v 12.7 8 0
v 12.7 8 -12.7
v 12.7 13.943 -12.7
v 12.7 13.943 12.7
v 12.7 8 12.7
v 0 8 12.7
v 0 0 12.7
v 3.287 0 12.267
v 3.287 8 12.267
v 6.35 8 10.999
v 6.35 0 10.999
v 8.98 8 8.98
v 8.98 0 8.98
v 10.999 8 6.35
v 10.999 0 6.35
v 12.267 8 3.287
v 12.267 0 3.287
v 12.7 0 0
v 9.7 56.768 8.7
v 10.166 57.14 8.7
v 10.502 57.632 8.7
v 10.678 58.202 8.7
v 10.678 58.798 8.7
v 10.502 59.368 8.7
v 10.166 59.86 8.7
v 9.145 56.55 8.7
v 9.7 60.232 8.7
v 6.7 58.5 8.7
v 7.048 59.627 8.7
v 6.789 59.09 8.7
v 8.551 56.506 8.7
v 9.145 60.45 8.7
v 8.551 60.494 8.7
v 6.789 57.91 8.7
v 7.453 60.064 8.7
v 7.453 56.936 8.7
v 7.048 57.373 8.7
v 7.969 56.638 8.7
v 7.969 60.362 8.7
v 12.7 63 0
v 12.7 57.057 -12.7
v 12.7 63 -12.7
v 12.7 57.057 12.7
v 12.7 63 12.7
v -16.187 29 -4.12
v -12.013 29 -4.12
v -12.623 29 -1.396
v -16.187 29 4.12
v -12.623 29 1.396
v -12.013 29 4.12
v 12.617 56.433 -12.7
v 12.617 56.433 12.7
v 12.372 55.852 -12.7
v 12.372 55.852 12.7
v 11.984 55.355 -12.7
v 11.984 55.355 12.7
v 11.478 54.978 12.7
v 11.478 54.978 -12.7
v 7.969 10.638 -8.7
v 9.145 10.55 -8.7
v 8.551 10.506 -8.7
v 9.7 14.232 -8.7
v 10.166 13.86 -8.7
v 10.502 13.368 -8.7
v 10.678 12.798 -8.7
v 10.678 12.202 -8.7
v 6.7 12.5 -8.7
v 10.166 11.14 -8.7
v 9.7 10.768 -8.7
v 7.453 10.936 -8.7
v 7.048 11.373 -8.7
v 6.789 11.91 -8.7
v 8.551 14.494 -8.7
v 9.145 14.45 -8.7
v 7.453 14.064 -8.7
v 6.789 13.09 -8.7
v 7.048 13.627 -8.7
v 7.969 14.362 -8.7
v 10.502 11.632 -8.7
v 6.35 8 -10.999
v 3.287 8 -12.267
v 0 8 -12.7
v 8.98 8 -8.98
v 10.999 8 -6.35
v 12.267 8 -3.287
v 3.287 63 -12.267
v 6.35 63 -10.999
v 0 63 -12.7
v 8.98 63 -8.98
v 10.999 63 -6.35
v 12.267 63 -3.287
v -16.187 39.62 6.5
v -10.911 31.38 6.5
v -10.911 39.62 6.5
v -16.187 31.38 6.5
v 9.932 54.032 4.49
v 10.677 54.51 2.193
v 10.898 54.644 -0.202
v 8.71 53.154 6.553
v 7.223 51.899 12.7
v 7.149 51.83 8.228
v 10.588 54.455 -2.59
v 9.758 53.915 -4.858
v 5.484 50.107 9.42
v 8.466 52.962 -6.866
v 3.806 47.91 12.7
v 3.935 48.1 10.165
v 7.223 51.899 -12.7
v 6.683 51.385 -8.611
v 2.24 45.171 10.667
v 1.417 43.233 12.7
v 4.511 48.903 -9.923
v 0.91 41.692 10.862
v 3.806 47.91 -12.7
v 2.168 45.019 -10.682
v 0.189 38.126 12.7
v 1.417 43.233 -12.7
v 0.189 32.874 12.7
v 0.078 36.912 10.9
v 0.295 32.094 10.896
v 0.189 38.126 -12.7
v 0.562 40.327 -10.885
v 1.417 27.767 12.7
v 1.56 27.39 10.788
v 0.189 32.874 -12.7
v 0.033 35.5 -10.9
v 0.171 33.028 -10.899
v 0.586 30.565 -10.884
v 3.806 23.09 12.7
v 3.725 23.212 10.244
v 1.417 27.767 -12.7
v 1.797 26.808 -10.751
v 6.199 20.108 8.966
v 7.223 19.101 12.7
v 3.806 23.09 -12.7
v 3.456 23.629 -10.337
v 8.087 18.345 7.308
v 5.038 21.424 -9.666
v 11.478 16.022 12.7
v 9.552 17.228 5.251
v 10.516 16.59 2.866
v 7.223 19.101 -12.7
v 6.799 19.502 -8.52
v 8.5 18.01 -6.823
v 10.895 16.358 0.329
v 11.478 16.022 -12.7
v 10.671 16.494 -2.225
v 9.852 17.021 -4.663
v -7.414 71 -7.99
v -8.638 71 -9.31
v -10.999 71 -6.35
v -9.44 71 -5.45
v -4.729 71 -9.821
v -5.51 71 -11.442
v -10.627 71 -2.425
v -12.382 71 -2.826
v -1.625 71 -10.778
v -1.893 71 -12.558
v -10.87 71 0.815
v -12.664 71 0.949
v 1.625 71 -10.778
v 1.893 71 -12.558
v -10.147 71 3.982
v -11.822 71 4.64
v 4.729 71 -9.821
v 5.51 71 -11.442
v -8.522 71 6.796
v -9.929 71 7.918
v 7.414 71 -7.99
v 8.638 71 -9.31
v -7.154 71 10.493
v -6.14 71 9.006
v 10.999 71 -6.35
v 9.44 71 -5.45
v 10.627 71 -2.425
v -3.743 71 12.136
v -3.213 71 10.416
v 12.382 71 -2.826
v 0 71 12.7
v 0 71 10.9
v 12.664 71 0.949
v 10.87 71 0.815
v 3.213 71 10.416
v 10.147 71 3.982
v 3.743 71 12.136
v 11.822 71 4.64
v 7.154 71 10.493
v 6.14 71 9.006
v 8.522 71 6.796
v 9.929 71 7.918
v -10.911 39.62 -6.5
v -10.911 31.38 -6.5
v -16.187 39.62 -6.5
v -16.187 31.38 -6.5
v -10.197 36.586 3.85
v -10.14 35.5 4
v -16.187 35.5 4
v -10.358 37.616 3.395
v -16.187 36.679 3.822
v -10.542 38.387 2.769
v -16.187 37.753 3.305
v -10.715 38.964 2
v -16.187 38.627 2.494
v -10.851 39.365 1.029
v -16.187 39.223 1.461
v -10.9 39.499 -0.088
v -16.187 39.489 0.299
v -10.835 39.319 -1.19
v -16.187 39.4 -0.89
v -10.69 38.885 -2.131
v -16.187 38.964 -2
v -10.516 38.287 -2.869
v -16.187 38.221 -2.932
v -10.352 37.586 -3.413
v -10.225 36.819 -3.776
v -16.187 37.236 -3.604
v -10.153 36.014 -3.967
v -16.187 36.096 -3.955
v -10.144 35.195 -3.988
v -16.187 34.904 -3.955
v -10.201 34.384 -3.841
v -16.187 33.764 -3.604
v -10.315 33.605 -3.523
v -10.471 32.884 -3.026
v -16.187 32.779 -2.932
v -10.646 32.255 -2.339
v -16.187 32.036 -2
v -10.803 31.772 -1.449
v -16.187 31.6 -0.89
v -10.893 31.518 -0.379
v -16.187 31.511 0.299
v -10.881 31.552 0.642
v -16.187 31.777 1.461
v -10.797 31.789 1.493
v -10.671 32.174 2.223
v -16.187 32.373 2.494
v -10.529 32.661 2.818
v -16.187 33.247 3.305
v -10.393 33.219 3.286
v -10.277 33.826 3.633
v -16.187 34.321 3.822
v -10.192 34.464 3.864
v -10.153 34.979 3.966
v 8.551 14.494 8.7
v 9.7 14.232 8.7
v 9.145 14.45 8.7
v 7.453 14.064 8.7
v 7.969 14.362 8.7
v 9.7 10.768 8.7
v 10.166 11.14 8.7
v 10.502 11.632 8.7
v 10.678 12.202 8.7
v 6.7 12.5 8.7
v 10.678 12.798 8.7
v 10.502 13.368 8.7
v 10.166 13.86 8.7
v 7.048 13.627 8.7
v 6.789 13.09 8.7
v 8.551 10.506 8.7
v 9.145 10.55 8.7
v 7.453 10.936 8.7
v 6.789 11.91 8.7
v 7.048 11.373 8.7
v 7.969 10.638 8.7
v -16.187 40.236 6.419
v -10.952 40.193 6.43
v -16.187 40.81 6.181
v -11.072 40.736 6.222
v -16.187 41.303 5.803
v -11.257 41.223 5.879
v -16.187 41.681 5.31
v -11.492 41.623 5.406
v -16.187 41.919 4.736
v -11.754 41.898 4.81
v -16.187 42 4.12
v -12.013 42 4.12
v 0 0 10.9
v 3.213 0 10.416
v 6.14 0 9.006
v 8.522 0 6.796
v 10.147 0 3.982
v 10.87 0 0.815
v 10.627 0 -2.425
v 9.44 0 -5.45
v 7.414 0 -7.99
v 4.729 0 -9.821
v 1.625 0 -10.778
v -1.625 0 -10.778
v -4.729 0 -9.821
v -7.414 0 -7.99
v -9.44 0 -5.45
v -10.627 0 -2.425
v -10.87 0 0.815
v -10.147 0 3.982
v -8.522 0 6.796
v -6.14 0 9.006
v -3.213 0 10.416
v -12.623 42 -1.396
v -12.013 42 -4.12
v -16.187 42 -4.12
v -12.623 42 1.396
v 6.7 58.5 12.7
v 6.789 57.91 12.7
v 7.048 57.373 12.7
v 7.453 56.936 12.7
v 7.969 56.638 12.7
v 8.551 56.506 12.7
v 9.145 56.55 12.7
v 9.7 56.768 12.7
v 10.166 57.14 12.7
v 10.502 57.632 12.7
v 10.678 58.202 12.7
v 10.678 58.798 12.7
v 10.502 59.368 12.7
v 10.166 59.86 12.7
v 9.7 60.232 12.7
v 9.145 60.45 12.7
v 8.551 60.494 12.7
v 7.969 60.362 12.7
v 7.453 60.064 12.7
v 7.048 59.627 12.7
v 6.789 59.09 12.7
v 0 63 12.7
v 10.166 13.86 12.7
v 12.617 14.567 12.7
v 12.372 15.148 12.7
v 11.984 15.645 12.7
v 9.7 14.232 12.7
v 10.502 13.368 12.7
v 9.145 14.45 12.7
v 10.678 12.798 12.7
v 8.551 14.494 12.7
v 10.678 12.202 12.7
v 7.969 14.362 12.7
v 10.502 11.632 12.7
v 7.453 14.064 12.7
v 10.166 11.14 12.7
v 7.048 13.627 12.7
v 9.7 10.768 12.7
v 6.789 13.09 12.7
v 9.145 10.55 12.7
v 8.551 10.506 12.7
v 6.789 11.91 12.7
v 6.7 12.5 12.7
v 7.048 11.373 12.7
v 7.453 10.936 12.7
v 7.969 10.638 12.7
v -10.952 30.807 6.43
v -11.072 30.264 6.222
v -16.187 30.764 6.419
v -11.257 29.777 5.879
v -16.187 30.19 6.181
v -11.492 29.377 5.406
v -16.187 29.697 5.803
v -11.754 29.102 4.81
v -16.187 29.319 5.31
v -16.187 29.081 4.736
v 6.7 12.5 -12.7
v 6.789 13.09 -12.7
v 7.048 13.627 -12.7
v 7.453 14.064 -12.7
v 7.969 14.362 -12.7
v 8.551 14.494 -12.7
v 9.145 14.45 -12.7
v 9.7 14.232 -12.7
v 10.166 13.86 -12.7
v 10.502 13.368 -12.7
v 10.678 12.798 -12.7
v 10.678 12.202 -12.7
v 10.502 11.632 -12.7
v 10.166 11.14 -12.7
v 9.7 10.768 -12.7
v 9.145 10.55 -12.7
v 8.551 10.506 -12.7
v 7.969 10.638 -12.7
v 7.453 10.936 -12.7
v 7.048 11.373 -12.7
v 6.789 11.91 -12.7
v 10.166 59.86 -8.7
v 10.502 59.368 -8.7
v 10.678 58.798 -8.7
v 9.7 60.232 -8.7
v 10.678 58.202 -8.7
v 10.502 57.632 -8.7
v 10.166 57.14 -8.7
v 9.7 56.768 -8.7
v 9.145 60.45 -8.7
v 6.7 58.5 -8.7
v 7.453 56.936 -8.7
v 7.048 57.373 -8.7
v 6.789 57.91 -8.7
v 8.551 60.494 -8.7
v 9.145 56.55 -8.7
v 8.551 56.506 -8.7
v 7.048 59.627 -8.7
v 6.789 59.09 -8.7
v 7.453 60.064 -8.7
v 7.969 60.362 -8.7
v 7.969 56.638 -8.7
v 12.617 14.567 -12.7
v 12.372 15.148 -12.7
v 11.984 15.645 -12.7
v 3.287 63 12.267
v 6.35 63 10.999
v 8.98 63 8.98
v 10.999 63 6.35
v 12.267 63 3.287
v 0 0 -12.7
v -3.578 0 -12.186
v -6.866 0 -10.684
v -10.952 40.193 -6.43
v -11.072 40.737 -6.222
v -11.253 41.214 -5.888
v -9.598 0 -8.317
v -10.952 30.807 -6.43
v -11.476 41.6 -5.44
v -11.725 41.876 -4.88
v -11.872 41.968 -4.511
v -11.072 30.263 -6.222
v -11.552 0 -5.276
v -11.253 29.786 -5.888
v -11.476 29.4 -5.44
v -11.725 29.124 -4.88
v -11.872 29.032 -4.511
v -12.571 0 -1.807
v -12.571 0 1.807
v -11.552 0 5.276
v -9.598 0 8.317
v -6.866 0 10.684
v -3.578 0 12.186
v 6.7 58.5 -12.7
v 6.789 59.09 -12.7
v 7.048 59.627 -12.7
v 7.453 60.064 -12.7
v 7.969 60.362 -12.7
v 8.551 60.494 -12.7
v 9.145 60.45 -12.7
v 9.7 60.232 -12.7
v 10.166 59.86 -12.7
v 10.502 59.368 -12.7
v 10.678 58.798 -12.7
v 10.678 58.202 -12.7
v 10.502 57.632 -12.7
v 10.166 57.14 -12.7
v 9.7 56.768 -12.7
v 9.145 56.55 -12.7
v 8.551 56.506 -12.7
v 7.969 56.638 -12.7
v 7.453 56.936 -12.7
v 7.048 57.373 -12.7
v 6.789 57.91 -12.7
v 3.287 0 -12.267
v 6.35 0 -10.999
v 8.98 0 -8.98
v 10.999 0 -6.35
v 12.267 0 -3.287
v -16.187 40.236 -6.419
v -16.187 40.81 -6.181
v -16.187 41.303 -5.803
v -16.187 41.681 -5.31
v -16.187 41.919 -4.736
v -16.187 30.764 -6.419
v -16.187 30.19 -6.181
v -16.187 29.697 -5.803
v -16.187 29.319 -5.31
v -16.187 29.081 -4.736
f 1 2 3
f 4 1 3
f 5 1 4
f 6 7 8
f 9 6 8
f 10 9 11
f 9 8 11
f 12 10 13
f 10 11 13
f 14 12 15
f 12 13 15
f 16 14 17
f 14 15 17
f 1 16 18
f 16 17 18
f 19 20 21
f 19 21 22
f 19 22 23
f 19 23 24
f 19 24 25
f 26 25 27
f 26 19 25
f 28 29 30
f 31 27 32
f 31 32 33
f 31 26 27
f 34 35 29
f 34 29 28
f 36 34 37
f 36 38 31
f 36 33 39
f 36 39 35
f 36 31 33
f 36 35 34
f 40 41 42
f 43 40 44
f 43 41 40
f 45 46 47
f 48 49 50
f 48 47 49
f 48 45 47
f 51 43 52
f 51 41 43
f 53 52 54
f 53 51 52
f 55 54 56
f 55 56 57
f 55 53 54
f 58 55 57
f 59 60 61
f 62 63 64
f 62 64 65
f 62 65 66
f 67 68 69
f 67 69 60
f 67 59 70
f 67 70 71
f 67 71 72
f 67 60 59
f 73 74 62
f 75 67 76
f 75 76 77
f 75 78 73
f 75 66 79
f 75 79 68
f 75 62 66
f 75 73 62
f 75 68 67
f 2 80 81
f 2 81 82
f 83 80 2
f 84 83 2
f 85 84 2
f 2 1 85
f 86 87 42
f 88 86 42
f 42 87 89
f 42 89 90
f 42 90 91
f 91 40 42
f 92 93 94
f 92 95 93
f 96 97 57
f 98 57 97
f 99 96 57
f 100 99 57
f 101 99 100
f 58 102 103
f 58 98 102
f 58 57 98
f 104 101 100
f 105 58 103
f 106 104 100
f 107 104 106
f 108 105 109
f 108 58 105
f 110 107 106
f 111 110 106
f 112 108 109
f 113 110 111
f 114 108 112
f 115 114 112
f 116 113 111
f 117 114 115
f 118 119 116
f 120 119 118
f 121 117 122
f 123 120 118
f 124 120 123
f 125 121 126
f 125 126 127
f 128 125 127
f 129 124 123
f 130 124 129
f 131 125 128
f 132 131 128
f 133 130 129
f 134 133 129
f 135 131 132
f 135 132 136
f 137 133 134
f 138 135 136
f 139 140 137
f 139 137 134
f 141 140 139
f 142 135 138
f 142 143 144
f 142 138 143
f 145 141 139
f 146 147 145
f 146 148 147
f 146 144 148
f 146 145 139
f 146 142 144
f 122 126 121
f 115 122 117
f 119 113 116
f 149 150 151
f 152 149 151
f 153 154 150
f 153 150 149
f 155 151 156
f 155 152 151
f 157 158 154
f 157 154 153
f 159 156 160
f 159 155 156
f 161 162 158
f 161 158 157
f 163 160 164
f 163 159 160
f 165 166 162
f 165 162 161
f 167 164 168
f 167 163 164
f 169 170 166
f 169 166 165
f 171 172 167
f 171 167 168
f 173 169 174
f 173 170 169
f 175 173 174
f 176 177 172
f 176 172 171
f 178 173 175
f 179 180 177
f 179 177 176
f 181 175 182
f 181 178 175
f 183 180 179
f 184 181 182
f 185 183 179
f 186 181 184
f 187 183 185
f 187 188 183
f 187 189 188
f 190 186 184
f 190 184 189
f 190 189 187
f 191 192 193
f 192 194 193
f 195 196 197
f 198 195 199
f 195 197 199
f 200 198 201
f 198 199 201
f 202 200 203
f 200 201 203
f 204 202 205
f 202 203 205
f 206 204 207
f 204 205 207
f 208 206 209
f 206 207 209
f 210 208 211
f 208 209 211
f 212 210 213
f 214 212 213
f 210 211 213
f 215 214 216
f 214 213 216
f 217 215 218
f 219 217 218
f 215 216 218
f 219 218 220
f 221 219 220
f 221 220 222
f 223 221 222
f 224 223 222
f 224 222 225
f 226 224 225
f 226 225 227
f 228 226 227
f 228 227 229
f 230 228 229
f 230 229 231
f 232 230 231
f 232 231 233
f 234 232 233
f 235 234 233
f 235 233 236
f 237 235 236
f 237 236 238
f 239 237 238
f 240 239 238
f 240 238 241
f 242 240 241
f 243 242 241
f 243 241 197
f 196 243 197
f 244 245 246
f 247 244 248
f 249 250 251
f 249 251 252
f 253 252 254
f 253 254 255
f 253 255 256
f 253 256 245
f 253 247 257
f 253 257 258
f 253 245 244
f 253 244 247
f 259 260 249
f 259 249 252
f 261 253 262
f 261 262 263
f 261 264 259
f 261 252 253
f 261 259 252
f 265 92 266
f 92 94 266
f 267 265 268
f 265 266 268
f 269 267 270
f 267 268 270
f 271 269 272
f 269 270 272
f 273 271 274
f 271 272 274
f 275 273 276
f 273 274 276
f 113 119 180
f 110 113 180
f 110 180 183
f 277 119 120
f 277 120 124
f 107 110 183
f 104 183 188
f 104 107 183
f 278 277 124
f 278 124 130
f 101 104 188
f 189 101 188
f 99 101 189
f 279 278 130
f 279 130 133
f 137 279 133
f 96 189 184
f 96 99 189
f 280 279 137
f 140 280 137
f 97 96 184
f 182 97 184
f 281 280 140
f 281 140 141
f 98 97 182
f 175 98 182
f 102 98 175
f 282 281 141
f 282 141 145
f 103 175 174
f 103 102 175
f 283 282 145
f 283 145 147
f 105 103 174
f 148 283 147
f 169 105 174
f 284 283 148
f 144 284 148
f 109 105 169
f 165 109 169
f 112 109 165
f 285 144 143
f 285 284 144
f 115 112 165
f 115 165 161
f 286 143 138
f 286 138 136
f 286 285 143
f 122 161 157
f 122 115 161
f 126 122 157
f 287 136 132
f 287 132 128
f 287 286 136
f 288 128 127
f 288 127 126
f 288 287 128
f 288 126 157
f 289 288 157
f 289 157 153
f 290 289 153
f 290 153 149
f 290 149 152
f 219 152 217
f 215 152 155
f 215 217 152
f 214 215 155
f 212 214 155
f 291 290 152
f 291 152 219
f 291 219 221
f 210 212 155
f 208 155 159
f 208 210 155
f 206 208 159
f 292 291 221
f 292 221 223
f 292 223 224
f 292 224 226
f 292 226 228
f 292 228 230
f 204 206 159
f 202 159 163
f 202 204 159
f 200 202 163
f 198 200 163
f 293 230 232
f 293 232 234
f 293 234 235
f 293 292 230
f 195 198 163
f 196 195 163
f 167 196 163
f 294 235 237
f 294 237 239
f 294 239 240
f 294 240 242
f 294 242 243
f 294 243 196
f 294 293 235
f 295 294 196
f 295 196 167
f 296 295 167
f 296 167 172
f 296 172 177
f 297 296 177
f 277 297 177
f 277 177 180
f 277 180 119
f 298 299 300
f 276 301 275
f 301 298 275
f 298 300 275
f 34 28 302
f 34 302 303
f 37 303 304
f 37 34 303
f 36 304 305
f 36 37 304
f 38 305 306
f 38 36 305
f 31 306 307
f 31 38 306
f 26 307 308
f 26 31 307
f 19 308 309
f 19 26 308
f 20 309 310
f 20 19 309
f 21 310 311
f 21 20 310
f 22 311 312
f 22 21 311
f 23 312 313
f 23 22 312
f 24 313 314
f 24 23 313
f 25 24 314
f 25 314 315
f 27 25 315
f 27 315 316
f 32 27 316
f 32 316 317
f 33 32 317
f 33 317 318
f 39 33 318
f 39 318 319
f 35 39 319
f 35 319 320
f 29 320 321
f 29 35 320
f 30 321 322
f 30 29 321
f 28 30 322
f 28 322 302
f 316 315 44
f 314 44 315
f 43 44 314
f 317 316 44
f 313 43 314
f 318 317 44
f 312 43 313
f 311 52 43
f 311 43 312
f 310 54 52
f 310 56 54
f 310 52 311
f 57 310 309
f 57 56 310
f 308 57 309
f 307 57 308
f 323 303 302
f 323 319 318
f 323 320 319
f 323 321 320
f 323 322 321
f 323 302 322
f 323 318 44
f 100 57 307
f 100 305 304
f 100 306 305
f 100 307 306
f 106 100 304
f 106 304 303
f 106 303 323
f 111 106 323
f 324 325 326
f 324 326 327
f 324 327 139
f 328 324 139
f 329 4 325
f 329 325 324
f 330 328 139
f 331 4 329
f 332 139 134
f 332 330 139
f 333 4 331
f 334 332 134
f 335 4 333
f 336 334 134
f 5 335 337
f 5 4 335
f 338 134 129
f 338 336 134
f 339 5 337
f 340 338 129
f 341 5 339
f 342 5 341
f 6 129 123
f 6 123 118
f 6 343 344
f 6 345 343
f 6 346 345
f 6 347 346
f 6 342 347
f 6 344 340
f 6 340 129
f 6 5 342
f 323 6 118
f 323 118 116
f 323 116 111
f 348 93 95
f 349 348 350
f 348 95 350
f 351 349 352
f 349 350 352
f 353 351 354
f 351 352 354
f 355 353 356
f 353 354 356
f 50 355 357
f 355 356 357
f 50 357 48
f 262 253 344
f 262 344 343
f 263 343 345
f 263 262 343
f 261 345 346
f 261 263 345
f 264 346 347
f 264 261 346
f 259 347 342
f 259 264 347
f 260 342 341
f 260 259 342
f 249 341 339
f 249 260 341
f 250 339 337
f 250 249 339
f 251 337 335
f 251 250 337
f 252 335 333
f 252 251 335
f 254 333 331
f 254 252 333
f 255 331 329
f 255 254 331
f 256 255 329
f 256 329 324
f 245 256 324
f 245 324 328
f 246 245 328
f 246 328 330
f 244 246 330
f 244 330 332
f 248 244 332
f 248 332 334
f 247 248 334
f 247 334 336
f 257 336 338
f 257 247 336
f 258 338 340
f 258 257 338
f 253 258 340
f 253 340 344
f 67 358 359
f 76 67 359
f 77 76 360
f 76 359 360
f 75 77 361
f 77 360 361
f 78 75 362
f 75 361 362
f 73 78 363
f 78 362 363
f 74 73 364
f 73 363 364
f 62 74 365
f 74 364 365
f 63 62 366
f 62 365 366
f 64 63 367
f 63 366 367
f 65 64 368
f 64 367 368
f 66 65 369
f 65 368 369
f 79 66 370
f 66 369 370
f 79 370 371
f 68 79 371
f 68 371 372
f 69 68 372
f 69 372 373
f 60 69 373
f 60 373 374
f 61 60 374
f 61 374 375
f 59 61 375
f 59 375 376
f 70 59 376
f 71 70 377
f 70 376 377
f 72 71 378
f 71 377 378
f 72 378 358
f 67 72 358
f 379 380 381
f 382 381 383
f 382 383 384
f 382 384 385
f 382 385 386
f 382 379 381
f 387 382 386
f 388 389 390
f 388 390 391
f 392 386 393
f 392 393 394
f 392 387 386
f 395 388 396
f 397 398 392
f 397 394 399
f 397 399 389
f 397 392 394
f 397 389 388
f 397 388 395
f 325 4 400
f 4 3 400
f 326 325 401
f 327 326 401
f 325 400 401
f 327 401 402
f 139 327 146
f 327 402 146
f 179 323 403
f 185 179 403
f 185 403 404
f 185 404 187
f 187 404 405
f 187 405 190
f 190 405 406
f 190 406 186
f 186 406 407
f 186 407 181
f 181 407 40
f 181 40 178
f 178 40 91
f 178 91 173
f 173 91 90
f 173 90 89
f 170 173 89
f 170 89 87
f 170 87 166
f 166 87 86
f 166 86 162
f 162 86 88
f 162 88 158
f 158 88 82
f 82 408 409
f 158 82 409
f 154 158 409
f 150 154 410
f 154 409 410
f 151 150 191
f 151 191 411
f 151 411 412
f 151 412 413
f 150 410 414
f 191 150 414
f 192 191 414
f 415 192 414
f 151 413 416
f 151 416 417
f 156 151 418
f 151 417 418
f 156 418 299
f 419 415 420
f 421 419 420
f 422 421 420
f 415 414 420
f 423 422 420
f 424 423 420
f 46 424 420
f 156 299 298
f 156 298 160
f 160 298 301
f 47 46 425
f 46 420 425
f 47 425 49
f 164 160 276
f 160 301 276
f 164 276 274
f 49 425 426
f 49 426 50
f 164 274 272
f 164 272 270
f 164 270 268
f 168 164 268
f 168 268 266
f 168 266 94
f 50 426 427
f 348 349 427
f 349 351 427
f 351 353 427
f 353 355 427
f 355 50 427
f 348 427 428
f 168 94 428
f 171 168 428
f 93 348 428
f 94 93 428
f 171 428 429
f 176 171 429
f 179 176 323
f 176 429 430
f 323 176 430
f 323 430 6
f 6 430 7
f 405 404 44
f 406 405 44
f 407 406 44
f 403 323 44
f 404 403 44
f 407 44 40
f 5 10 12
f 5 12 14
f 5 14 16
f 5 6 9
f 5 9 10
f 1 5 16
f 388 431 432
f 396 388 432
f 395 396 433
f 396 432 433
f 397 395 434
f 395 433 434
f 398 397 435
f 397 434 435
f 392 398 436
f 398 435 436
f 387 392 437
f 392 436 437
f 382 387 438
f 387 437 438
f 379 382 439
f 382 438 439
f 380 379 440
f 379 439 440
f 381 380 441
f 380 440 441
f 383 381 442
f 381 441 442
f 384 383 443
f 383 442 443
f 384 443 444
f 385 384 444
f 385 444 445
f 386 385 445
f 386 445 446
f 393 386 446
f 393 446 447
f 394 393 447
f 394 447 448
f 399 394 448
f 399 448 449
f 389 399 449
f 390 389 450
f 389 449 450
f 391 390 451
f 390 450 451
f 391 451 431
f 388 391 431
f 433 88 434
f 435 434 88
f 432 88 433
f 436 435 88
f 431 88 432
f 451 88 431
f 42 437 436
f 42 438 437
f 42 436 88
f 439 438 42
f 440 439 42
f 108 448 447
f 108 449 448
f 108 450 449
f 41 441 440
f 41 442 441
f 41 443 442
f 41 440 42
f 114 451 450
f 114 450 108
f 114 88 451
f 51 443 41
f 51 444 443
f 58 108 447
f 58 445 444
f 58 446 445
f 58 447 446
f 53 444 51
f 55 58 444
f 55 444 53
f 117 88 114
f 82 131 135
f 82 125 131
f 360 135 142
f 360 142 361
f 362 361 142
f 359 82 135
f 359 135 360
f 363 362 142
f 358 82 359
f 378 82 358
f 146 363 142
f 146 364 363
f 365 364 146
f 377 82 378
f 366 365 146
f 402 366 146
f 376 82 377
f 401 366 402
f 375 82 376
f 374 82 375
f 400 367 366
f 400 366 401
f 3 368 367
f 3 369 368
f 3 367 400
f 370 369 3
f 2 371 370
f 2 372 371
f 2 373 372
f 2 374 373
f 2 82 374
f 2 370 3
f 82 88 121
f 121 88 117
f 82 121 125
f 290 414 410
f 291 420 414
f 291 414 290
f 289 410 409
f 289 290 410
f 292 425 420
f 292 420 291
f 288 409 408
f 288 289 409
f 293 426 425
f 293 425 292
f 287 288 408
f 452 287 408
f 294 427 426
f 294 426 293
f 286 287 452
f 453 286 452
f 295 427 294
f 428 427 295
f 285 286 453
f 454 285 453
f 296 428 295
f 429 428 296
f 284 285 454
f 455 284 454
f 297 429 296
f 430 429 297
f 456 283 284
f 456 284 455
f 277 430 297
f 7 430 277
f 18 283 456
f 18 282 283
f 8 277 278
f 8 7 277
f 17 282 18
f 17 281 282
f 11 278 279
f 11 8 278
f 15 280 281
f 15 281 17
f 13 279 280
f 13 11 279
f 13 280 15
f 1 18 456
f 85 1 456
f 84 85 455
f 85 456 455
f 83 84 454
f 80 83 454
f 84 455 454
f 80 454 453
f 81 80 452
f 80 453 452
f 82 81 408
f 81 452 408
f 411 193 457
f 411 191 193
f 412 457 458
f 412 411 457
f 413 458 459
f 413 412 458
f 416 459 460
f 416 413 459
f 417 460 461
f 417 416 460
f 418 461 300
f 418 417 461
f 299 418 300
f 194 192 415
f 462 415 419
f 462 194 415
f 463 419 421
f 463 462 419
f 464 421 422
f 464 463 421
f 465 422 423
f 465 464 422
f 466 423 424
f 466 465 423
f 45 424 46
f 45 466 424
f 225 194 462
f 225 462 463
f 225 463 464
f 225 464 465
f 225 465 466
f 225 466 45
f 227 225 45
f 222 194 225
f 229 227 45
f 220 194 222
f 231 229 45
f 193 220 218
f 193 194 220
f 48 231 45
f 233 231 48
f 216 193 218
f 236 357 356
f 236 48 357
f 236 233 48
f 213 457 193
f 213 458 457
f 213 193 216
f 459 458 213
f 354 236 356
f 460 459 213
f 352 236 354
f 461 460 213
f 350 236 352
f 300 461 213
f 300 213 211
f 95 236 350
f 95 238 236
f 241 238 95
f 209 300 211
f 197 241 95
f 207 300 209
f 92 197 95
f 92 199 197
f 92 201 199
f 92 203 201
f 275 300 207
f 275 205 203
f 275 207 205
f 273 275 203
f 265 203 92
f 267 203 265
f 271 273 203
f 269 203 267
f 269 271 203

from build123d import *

# Parameters (mm, degrees)
SKETCH1_R                = 12.7
SKETCH1_R_2              = 10.9
BOSS_EXTRUDE1_DEPTH      = 71
BOSS_EXTRUDE2_DEPTH      = 63
CUT_EXTRUDE1_DEPTH       = 8
CUT_EXTRUDE2_DEPTH       = 15
CUT_EXTRUDE2_DEPTH_BACK  = 16
SKETCH4_R                = 22.297733005
SKETCH5_R                = 2
CUT_EXTRUDE3_DEPTH       = 4
CUT_EXTRUDE4_START       = -4
SKETCH6_R                = 2
CUT_EXTRUDE4_DEPTH       = 4
BOSS_EXTRUDE3_DEPTH      = 6.5
BOSS_EXTRUDE3_DEPTH_BACK = 6.5
SKETCH15_R               = 4
CUT_EXTRUDE14_DEPTH      = 7.5
BOSS_EXTRUDE4_START      = 1.75
SKETCH16_W               = 13
SKETCH16_H               = 13
SKETCH16_R               = 4
BOSS_EXTRUDE4_DEPTH      = 1.75
FILLET1_R                = 2.38
FILLET2_R                = 2.38


with BuildPart() as part:
    # Sketch1 → Boss-Extrude1 (new body)
    with BuildSketch(Plane(origin=(0, 0, 0), x_dir=(1, 0, 0), z_dir=(0, 1, 0))):
        with Locations(Location((0, 0, 0), (0, 0, 270))):
            Circle(SKETCH1_R)
        with Locations(Location((0, 0, 0), (0, 0, 270))):
            Circle(SKETCH1_R_2, mode=Mode.SUBTRACT)
    extrude(amount=BOSS_EXTRUDE1_DEPTH)

    # Sketch2 → Boss-Extrude2 (add)
    with BuildSketch(Plane.XZ):
        with BuildLine():
            Line((12.7, 12.7), (0, 12.7))
            ThreePointArc((0, 12.7), (8.980256121, 8.980256121), (12.7, 0))
            Line((12.7, 0), (12.7, 12.7))
        make_face()
        with BuildLine():
            Line((12.7, -12.7), (12.7, 0))
            ThreePointArc((12.7, 0), (8.980256121, -8.980256121), (0, -12.7))
            Line((0, -12.7), (12.7, -12.7))
        make_face()
    extrude(amount=-BOSS_EXTRUDE2_DEPTH)

    # Sketch3 → Cut-Extrude1 (cut)
    with BuildSketch(Plane.XZ):
        with BuildLine():
            Line((12.7, 12.7), (0, 12.7))
            ThreePointArc((0, 12.7), (8.980256109, 8.980256133), (12.7, 3.4e-08))
            Line((12.7, 3.4e-08), (12.7, 12.7))
        make_face()
        with BuildLine():
            Line((12.7, -12.7), (12.7, 3.4e-08))
            ThreePointArc((12.7, 3.4e-08), (8.980256133, -8.980256109), (0, -12.7))
            Line((0, -12.7), (12.7, -12.7))
        make_face()
    extrude(amount=-CUT_EXTRUDE1_DEPTH, mode=Mode.SUBTRACT)

    # Sketch4 → Cut-Extrude2 (cut, two sides: drawn at the far end of the back side and taken through both)
    with BuildSketch(Plane.XY.offset(-CUT_EXTRUDE2_DEPTH_BACK)):
        with Locations((22.331187996, 35.5)):
            Circle(SKETCH4_R)
    extrude(amount=CUT_EXTRUDE2_DEPTH + CUT_EXTRUDE2_DEPTH_BACK, mode=Mode.SUBTRACT)

    # Sketch5 → Cut-Extrude3 (cut)
    with BuildSketch(Plane(origin=(0, 0, -12.7), x_dir=(-1, 0, 0), z_dir=(0, 0, -1))):
        with Locations((-8.7, 58.5)):
            Circle(SKETCH5_R)
        with Locations((-8.7, 12.5)):
            Circle(SKETCH5_R)
    extrude(amount=-CUT_EXTRUDE3_DEPTH, mode=Mode.SUBTRACT)

    # Sketch6 → Cut-Extrude4 (cut)
    with BuildSketch(Plane.XY.offset(12.7).offset(CUT_EXTRUDE4_START)):
        with Locations(Location((8.7, 58.5, 0), (0, 0, 180))):
            Circle(SKETCH6_R)
        with Locations(Location((8.7, 12.5, 0), (0, 0, 180))):
            Circle(SKETCH6_R)
    extrude(amount=CUT_EXTRUDE4_DEPTH, mode=Mode.SUBTRACT)

    # Sketch14 → Boss-Extrude3 (add, two sides: drawn at the far end of the back side and taken through both)
    with BuildSketch(Plane(origin=(0, 35.5, 0), x_dir=(1, 0, 0), z_dir=(0, 1, 0)).offset(-BOSS_EXTRUDE3_DEPTH_BACK)):
        with BuildLine():
            Line((-14.4365, -6.5), (-14.4365, 6.5))
            Line((-14.4365, 6.5), (-10.836564596, 6.5))
            ThreePointArc((-10.836564596, 6.5), (-12.6365, 0), (-10.836564596, -6.5))
            Line((-10.836564596, -6.5), (-14.4365, -6.5))
        make_face()
    extrude(amount=BOSS_EXTRUDE3_DEPTH + BOSS_EXTRUDE3_DEPTH_BACK)

    # Sketch15 → Cut-Extrude14 (cut)
    with BuildSketch(Plane.ZY.offset(14.4365)):
        with Locations((0, 35.5)):
            Circle(SKETCH15_R)
    extrude(amount=-CUT_EXTRUDE14_DEPTH, mode=Mode.SUBTRACT)

    # Sketch16 → Boss-Extrude4 (add)
    with BuildSketch(Plane.ZY.offset(14.4365).offset(BOSS_EXTRUDE4_START)):
        with Locations((0, 35.5)):
            Rectangle(SKETCH16_W, SKETCH16_H)
        with Locations((0, 35.5)):
            Circle(SKETCH16_R, mode=Mode.SUBTRACT)
    extrude(amount=-BOSS_EXTRUDE4_DEPTH)

    # Fillet1
    fillet1_edges = [part.edges().sort_by_distance(p)[0] for p in [
        (-13.548522679, 29, 6.5),
        (-13.548522679, 29, -6.5),
        (-13.548522679, 42, -6.5),
        (-13.548522679, 42, 6.5),
    ]]
    fillet(fillet1_edges, radius=FILLET1_R)

    # Fillet2
    fillet2_edges = [part.edges().sort_by_distance(p)[0] for p in [
        (12.7, 15.389576958, 0),
        (12.7, 55.610423042, 0),
    ]]
    fillet(fillet2_edges, radius=FILLET2_R)


solid = part.part
